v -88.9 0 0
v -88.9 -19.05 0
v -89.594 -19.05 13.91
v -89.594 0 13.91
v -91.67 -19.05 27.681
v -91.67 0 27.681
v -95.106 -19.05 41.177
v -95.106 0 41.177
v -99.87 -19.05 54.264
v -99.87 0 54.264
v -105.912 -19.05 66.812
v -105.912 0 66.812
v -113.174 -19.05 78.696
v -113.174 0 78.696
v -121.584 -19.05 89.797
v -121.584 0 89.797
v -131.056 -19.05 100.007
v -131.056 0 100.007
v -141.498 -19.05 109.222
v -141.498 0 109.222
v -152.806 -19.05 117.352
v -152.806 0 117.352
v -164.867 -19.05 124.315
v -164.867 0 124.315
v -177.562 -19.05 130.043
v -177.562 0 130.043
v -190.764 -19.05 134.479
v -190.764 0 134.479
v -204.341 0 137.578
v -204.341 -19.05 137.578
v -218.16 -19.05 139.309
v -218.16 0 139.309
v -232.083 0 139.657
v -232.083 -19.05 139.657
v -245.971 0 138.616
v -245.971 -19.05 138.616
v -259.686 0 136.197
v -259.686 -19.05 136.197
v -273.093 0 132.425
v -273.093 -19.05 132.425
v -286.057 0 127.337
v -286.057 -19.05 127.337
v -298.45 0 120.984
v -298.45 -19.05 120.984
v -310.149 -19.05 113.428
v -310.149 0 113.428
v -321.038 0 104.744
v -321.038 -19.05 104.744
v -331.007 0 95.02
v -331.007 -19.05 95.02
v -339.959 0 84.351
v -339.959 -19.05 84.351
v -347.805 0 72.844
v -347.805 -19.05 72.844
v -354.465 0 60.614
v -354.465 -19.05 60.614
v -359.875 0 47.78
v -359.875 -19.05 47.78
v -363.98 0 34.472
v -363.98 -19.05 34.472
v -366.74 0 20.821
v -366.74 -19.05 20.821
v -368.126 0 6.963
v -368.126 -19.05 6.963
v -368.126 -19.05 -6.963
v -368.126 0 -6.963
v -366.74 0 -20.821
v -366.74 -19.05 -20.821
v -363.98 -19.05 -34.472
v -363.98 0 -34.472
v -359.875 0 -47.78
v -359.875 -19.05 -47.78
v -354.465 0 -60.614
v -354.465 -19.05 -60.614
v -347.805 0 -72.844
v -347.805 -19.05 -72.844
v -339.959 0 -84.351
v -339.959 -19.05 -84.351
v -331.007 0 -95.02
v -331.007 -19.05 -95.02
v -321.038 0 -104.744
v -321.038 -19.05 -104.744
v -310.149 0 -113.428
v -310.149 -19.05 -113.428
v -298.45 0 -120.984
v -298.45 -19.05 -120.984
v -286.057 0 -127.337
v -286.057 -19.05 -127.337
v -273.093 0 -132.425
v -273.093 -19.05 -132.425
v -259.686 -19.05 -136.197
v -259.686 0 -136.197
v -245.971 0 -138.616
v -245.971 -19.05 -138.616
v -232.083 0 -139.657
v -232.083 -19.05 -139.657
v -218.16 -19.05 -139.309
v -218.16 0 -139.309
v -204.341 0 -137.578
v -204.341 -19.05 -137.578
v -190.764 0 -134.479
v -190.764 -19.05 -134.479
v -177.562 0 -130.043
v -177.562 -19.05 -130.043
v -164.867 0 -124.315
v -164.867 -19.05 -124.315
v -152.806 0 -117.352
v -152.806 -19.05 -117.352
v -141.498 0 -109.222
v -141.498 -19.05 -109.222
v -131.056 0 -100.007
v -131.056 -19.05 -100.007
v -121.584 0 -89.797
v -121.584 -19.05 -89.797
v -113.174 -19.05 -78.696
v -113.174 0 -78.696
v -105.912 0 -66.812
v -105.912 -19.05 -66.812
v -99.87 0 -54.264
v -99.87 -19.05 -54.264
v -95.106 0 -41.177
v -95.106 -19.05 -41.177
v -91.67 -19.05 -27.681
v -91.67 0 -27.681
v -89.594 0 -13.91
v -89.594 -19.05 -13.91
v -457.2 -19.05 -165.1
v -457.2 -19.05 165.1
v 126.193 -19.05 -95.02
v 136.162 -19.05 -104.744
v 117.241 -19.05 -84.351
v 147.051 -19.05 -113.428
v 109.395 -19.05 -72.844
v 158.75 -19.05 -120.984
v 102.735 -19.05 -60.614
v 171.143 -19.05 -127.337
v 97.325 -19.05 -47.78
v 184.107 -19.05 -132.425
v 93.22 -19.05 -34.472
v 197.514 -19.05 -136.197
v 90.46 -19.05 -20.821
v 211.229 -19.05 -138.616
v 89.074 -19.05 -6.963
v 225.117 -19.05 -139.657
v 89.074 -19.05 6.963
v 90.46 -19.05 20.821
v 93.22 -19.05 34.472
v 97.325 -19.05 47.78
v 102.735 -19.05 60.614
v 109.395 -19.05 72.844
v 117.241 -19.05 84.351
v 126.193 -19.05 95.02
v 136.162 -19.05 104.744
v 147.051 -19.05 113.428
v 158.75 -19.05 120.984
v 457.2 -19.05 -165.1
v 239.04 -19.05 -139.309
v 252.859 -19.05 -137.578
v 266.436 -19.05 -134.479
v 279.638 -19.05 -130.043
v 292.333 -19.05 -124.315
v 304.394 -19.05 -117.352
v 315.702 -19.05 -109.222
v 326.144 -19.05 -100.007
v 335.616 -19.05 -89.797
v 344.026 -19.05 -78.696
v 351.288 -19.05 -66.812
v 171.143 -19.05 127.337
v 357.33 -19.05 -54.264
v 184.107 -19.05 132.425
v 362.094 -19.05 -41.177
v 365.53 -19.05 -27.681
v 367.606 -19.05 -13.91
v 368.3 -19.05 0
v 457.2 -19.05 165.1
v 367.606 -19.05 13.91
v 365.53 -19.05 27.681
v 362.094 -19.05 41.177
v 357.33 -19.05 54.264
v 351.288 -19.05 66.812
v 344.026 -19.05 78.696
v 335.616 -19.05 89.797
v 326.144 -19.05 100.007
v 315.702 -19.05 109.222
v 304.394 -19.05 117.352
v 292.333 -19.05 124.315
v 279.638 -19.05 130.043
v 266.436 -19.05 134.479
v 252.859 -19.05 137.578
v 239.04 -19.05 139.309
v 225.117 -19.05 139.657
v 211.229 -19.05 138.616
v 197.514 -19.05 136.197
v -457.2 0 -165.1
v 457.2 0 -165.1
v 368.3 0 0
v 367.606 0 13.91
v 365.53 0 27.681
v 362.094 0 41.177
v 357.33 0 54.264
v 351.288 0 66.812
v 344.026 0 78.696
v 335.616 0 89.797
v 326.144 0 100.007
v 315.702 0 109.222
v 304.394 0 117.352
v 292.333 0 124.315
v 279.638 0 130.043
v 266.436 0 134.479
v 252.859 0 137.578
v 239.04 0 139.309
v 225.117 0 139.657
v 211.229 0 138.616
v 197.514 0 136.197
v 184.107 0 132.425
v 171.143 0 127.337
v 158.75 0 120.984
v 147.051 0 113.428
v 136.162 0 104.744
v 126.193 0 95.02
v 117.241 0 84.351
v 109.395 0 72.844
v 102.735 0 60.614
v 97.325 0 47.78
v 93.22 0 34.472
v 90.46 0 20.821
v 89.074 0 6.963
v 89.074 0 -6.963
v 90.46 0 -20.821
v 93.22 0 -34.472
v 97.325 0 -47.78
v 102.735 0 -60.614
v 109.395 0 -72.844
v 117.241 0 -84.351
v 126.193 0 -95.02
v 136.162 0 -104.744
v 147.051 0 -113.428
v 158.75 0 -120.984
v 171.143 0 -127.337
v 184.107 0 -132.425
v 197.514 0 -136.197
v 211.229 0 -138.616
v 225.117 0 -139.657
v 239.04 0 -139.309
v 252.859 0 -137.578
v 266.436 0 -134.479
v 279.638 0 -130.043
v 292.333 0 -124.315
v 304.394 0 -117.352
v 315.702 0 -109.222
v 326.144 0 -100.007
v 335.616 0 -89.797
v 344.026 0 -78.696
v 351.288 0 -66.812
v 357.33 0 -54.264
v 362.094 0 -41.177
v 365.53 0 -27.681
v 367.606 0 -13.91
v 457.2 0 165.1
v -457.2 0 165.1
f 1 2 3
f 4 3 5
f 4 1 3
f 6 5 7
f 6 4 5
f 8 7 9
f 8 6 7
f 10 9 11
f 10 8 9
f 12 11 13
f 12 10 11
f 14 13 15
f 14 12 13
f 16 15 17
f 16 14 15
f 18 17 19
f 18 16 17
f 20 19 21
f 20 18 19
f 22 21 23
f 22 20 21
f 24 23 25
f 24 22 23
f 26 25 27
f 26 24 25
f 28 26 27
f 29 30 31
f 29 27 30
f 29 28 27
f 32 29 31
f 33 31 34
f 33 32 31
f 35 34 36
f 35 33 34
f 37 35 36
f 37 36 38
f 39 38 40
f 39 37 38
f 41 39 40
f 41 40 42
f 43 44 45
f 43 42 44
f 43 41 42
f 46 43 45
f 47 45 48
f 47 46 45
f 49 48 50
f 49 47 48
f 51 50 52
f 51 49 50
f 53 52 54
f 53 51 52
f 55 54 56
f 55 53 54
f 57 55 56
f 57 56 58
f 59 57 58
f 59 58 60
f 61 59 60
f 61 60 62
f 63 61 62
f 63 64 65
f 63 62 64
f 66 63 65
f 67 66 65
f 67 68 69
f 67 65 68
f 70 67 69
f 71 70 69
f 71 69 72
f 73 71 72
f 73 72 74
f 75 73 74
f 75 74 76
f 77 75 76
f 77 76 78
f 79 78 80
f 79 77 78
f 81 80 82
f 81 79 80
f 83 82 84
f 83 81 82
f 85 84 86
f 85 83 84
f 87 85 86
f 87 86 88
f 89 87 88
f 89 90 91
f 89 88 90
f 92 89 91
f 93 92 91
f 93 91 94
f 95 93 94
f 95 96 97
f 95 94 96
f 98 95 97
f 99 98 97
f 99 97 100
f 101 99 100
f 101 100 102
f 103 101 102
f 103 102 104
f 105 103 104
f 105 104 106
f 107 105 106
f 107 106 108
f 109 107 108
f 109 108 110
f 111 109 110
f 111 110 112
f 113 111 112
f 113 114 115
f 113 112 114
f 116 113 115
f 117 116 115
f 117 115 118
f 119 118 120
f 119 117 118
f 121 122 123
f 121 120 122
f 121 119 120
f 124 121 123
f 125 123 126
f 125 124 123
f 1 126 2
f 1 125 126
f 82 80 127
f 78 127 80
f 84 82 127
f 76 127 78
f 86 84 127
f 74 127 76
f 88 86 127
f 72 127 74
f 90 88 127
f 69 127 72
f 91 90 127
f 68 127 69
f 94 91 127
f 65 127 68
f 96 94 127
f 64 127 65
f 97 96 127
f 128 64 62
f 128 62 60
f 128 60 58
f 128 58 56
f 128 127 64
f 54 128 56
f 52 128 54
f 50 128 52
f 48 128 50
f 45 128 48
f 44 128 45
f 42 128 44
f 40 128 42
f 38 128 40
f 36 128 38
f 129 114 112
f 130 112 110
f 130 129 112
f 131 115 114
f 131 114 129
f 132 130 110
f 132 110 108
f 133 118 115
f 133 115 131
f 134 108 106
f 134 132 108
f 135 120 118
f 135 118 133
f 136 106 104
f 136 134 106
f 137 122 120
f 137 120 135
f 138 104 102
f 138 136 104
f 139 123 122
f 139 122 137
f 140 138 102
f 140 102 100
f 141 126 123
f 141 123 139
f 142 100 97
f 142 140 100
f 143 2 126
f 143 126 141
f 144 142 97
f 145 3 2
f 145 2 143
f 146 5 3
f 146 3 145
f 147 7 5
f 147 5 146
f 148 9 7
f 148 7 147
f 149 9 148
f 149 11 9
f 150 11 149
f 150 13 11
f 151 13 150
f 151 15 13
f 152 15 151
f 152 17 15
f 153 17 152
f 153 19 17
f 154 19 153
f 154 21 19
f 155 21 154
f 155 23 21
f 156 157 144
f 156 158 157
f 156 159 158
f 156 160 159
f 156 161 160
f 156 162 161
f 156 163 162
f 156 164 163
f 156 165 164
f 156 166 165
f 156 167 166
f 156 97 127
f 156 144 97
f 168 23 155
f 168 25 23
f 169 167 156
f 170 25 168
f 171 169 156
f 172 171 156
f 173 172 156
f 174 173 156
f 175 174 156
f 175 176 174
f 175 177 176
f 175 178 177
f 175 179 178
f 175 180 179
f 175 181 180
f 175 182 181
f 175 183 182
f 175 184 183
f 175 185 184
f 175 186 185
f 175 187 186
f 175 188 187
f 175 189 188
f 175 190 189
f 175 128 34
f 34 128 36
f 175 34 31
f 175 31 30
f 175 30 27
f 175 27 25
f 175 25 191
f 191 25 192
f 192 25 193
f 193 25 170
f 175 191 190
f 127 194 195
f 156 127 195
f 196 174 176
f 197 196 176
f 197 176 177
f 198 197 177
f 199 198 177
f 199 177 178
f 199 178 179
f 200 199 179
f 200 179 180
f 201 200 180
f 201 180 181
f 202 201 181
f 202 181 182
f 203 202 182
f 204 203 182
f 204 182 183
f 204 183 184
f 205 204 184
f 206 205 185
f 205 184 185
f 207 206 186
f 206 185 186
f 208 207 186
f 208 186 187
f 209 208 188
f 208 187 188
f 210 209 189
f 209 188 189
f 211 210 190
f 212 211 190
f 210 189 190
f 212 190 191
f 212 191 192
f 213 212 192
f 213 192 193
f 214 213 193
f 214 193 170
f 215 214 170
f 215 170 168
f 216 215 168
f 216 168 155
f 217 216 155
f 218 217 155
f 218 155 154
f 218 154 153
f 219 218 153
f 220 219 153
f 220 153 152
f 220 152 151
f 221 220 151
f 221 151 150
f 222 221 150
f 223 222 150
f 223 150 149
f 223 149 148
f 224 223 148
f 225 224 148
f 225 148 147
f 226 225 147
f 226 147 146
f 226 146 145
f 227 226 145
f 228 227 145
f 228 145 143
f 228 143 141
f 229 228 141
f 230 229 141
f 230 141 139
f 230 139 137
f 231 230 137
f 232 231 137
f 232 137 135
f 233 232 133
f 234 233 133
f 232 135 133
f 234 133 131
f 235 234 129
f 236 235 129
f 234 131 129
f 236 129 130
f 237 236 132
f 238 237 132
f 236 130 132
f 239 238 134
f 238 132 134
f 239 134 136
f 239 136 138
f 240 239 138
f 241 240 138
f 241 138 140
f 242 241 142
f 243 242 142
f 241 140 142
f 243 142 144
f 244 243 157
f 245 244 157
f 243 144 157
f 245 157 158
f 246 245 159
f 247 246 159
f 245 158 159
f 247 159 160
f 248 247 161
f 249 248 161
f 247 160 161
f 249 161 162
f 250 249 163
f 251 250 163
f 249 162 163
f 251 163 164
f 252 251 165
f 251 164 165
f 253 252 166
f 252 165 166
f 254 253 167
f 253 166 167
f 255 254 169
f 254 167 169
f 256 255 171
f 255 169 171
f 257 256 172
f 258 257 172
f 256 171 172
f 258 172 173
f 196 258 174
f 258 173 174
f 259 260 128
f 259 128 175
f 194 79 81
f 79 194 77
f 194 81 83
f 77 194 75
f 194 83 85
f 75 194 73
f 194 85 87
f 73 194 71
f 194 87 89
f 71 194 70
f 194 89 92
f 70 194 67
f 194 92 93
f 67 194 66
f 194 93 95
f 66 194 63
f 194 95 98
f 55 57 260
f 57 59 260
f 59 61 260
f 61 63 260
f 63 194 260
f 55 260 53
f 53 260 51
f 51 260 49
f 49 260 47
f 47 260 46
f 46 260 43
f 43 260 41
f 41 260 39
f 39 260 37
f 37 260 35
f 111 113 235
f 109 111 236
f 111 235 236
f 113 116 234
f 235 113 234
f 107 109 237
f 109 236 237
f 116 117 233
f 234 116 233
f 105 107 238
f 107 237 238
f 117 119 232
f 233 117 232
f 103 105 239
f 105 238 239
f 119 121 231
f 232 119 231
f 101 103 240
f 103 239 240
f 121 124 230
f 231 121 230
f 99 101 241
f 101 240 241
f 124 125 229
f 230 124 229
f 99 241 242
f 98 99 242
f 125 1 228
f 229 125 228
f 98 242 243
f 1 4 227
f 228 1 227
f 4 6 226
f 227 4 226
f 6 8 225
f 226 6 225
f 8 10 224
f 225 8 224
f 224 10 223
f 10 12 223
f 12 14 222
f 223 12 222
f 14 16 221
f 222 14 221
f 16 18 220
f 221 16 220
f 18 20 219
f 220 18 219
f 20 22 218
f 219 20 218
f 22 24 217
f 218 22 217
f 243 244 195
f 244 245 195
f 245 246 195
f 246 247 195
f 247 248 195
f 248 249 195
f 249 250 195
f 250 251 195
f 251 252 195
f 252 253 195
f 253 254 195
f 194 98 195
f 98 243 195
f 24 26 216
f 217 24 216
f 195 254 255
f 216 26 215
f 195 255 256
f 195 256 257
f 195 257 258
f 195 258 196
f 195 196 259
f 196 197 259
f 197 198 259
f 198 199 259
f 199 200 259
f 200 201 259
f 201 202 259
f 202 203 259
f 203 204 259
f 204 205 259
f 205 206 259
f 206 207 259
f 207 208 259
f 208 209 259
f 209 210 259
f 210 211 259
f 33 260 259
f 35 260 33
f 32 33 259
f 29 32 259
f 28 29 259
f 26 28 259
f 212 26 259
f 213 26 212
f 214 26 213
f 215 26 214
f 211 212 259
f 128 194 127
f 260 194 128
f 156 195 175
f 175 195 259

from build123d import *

# Parameters (mm, degrees)
F0_W     = 914.4
F0_H     = 330.2
F2_DEPTH = 19.05
F1_R     = 139.7
F3_DEPTH = 982
F4_DEPTH = 19.051
F5_R     = 139.7
F6_DEPTH = 19.051


# Not quite as in the source:
# - an extrude ends at something that could not be found from the text; its depth is read off the source's solid


with BuildPart() as f2:
    # F0 (on Front) → F2 (new body)
    with BuildSketch(Plane.XZ):
        Rectangle(F0_W, F0_H)
    extrude(amount=F2_DEPTH)

    # F1 (on face) → F3 (cut, through all)
    with BuildSketch(Plane.XZ):
        with Locations((-228.6, 0)):
            Circle(F1_R)
    extrude(amount=-F3_DEPTH, mode=Mode.SUBTRACT)

    # F1 (on face) → F4 (cut, through all)
    with BuildSketch(Plane.XZ):
        with Locations((-228.6, 0)):
            Circle(F1_R)
    extrude(amount=F4_DEPTH, mode=Mode.SUBTRACT)

    # F5 (on face) → F6 (cut, through all)
    with BuildSketch(Plane.XZ.offset(19.05)):
        with Locations((228.6, 0)):
            Circle(F5_R)
    extrude(amount=-F6_DEPTH, mode=Mode.SUBTRACT)


solid = f2.part
